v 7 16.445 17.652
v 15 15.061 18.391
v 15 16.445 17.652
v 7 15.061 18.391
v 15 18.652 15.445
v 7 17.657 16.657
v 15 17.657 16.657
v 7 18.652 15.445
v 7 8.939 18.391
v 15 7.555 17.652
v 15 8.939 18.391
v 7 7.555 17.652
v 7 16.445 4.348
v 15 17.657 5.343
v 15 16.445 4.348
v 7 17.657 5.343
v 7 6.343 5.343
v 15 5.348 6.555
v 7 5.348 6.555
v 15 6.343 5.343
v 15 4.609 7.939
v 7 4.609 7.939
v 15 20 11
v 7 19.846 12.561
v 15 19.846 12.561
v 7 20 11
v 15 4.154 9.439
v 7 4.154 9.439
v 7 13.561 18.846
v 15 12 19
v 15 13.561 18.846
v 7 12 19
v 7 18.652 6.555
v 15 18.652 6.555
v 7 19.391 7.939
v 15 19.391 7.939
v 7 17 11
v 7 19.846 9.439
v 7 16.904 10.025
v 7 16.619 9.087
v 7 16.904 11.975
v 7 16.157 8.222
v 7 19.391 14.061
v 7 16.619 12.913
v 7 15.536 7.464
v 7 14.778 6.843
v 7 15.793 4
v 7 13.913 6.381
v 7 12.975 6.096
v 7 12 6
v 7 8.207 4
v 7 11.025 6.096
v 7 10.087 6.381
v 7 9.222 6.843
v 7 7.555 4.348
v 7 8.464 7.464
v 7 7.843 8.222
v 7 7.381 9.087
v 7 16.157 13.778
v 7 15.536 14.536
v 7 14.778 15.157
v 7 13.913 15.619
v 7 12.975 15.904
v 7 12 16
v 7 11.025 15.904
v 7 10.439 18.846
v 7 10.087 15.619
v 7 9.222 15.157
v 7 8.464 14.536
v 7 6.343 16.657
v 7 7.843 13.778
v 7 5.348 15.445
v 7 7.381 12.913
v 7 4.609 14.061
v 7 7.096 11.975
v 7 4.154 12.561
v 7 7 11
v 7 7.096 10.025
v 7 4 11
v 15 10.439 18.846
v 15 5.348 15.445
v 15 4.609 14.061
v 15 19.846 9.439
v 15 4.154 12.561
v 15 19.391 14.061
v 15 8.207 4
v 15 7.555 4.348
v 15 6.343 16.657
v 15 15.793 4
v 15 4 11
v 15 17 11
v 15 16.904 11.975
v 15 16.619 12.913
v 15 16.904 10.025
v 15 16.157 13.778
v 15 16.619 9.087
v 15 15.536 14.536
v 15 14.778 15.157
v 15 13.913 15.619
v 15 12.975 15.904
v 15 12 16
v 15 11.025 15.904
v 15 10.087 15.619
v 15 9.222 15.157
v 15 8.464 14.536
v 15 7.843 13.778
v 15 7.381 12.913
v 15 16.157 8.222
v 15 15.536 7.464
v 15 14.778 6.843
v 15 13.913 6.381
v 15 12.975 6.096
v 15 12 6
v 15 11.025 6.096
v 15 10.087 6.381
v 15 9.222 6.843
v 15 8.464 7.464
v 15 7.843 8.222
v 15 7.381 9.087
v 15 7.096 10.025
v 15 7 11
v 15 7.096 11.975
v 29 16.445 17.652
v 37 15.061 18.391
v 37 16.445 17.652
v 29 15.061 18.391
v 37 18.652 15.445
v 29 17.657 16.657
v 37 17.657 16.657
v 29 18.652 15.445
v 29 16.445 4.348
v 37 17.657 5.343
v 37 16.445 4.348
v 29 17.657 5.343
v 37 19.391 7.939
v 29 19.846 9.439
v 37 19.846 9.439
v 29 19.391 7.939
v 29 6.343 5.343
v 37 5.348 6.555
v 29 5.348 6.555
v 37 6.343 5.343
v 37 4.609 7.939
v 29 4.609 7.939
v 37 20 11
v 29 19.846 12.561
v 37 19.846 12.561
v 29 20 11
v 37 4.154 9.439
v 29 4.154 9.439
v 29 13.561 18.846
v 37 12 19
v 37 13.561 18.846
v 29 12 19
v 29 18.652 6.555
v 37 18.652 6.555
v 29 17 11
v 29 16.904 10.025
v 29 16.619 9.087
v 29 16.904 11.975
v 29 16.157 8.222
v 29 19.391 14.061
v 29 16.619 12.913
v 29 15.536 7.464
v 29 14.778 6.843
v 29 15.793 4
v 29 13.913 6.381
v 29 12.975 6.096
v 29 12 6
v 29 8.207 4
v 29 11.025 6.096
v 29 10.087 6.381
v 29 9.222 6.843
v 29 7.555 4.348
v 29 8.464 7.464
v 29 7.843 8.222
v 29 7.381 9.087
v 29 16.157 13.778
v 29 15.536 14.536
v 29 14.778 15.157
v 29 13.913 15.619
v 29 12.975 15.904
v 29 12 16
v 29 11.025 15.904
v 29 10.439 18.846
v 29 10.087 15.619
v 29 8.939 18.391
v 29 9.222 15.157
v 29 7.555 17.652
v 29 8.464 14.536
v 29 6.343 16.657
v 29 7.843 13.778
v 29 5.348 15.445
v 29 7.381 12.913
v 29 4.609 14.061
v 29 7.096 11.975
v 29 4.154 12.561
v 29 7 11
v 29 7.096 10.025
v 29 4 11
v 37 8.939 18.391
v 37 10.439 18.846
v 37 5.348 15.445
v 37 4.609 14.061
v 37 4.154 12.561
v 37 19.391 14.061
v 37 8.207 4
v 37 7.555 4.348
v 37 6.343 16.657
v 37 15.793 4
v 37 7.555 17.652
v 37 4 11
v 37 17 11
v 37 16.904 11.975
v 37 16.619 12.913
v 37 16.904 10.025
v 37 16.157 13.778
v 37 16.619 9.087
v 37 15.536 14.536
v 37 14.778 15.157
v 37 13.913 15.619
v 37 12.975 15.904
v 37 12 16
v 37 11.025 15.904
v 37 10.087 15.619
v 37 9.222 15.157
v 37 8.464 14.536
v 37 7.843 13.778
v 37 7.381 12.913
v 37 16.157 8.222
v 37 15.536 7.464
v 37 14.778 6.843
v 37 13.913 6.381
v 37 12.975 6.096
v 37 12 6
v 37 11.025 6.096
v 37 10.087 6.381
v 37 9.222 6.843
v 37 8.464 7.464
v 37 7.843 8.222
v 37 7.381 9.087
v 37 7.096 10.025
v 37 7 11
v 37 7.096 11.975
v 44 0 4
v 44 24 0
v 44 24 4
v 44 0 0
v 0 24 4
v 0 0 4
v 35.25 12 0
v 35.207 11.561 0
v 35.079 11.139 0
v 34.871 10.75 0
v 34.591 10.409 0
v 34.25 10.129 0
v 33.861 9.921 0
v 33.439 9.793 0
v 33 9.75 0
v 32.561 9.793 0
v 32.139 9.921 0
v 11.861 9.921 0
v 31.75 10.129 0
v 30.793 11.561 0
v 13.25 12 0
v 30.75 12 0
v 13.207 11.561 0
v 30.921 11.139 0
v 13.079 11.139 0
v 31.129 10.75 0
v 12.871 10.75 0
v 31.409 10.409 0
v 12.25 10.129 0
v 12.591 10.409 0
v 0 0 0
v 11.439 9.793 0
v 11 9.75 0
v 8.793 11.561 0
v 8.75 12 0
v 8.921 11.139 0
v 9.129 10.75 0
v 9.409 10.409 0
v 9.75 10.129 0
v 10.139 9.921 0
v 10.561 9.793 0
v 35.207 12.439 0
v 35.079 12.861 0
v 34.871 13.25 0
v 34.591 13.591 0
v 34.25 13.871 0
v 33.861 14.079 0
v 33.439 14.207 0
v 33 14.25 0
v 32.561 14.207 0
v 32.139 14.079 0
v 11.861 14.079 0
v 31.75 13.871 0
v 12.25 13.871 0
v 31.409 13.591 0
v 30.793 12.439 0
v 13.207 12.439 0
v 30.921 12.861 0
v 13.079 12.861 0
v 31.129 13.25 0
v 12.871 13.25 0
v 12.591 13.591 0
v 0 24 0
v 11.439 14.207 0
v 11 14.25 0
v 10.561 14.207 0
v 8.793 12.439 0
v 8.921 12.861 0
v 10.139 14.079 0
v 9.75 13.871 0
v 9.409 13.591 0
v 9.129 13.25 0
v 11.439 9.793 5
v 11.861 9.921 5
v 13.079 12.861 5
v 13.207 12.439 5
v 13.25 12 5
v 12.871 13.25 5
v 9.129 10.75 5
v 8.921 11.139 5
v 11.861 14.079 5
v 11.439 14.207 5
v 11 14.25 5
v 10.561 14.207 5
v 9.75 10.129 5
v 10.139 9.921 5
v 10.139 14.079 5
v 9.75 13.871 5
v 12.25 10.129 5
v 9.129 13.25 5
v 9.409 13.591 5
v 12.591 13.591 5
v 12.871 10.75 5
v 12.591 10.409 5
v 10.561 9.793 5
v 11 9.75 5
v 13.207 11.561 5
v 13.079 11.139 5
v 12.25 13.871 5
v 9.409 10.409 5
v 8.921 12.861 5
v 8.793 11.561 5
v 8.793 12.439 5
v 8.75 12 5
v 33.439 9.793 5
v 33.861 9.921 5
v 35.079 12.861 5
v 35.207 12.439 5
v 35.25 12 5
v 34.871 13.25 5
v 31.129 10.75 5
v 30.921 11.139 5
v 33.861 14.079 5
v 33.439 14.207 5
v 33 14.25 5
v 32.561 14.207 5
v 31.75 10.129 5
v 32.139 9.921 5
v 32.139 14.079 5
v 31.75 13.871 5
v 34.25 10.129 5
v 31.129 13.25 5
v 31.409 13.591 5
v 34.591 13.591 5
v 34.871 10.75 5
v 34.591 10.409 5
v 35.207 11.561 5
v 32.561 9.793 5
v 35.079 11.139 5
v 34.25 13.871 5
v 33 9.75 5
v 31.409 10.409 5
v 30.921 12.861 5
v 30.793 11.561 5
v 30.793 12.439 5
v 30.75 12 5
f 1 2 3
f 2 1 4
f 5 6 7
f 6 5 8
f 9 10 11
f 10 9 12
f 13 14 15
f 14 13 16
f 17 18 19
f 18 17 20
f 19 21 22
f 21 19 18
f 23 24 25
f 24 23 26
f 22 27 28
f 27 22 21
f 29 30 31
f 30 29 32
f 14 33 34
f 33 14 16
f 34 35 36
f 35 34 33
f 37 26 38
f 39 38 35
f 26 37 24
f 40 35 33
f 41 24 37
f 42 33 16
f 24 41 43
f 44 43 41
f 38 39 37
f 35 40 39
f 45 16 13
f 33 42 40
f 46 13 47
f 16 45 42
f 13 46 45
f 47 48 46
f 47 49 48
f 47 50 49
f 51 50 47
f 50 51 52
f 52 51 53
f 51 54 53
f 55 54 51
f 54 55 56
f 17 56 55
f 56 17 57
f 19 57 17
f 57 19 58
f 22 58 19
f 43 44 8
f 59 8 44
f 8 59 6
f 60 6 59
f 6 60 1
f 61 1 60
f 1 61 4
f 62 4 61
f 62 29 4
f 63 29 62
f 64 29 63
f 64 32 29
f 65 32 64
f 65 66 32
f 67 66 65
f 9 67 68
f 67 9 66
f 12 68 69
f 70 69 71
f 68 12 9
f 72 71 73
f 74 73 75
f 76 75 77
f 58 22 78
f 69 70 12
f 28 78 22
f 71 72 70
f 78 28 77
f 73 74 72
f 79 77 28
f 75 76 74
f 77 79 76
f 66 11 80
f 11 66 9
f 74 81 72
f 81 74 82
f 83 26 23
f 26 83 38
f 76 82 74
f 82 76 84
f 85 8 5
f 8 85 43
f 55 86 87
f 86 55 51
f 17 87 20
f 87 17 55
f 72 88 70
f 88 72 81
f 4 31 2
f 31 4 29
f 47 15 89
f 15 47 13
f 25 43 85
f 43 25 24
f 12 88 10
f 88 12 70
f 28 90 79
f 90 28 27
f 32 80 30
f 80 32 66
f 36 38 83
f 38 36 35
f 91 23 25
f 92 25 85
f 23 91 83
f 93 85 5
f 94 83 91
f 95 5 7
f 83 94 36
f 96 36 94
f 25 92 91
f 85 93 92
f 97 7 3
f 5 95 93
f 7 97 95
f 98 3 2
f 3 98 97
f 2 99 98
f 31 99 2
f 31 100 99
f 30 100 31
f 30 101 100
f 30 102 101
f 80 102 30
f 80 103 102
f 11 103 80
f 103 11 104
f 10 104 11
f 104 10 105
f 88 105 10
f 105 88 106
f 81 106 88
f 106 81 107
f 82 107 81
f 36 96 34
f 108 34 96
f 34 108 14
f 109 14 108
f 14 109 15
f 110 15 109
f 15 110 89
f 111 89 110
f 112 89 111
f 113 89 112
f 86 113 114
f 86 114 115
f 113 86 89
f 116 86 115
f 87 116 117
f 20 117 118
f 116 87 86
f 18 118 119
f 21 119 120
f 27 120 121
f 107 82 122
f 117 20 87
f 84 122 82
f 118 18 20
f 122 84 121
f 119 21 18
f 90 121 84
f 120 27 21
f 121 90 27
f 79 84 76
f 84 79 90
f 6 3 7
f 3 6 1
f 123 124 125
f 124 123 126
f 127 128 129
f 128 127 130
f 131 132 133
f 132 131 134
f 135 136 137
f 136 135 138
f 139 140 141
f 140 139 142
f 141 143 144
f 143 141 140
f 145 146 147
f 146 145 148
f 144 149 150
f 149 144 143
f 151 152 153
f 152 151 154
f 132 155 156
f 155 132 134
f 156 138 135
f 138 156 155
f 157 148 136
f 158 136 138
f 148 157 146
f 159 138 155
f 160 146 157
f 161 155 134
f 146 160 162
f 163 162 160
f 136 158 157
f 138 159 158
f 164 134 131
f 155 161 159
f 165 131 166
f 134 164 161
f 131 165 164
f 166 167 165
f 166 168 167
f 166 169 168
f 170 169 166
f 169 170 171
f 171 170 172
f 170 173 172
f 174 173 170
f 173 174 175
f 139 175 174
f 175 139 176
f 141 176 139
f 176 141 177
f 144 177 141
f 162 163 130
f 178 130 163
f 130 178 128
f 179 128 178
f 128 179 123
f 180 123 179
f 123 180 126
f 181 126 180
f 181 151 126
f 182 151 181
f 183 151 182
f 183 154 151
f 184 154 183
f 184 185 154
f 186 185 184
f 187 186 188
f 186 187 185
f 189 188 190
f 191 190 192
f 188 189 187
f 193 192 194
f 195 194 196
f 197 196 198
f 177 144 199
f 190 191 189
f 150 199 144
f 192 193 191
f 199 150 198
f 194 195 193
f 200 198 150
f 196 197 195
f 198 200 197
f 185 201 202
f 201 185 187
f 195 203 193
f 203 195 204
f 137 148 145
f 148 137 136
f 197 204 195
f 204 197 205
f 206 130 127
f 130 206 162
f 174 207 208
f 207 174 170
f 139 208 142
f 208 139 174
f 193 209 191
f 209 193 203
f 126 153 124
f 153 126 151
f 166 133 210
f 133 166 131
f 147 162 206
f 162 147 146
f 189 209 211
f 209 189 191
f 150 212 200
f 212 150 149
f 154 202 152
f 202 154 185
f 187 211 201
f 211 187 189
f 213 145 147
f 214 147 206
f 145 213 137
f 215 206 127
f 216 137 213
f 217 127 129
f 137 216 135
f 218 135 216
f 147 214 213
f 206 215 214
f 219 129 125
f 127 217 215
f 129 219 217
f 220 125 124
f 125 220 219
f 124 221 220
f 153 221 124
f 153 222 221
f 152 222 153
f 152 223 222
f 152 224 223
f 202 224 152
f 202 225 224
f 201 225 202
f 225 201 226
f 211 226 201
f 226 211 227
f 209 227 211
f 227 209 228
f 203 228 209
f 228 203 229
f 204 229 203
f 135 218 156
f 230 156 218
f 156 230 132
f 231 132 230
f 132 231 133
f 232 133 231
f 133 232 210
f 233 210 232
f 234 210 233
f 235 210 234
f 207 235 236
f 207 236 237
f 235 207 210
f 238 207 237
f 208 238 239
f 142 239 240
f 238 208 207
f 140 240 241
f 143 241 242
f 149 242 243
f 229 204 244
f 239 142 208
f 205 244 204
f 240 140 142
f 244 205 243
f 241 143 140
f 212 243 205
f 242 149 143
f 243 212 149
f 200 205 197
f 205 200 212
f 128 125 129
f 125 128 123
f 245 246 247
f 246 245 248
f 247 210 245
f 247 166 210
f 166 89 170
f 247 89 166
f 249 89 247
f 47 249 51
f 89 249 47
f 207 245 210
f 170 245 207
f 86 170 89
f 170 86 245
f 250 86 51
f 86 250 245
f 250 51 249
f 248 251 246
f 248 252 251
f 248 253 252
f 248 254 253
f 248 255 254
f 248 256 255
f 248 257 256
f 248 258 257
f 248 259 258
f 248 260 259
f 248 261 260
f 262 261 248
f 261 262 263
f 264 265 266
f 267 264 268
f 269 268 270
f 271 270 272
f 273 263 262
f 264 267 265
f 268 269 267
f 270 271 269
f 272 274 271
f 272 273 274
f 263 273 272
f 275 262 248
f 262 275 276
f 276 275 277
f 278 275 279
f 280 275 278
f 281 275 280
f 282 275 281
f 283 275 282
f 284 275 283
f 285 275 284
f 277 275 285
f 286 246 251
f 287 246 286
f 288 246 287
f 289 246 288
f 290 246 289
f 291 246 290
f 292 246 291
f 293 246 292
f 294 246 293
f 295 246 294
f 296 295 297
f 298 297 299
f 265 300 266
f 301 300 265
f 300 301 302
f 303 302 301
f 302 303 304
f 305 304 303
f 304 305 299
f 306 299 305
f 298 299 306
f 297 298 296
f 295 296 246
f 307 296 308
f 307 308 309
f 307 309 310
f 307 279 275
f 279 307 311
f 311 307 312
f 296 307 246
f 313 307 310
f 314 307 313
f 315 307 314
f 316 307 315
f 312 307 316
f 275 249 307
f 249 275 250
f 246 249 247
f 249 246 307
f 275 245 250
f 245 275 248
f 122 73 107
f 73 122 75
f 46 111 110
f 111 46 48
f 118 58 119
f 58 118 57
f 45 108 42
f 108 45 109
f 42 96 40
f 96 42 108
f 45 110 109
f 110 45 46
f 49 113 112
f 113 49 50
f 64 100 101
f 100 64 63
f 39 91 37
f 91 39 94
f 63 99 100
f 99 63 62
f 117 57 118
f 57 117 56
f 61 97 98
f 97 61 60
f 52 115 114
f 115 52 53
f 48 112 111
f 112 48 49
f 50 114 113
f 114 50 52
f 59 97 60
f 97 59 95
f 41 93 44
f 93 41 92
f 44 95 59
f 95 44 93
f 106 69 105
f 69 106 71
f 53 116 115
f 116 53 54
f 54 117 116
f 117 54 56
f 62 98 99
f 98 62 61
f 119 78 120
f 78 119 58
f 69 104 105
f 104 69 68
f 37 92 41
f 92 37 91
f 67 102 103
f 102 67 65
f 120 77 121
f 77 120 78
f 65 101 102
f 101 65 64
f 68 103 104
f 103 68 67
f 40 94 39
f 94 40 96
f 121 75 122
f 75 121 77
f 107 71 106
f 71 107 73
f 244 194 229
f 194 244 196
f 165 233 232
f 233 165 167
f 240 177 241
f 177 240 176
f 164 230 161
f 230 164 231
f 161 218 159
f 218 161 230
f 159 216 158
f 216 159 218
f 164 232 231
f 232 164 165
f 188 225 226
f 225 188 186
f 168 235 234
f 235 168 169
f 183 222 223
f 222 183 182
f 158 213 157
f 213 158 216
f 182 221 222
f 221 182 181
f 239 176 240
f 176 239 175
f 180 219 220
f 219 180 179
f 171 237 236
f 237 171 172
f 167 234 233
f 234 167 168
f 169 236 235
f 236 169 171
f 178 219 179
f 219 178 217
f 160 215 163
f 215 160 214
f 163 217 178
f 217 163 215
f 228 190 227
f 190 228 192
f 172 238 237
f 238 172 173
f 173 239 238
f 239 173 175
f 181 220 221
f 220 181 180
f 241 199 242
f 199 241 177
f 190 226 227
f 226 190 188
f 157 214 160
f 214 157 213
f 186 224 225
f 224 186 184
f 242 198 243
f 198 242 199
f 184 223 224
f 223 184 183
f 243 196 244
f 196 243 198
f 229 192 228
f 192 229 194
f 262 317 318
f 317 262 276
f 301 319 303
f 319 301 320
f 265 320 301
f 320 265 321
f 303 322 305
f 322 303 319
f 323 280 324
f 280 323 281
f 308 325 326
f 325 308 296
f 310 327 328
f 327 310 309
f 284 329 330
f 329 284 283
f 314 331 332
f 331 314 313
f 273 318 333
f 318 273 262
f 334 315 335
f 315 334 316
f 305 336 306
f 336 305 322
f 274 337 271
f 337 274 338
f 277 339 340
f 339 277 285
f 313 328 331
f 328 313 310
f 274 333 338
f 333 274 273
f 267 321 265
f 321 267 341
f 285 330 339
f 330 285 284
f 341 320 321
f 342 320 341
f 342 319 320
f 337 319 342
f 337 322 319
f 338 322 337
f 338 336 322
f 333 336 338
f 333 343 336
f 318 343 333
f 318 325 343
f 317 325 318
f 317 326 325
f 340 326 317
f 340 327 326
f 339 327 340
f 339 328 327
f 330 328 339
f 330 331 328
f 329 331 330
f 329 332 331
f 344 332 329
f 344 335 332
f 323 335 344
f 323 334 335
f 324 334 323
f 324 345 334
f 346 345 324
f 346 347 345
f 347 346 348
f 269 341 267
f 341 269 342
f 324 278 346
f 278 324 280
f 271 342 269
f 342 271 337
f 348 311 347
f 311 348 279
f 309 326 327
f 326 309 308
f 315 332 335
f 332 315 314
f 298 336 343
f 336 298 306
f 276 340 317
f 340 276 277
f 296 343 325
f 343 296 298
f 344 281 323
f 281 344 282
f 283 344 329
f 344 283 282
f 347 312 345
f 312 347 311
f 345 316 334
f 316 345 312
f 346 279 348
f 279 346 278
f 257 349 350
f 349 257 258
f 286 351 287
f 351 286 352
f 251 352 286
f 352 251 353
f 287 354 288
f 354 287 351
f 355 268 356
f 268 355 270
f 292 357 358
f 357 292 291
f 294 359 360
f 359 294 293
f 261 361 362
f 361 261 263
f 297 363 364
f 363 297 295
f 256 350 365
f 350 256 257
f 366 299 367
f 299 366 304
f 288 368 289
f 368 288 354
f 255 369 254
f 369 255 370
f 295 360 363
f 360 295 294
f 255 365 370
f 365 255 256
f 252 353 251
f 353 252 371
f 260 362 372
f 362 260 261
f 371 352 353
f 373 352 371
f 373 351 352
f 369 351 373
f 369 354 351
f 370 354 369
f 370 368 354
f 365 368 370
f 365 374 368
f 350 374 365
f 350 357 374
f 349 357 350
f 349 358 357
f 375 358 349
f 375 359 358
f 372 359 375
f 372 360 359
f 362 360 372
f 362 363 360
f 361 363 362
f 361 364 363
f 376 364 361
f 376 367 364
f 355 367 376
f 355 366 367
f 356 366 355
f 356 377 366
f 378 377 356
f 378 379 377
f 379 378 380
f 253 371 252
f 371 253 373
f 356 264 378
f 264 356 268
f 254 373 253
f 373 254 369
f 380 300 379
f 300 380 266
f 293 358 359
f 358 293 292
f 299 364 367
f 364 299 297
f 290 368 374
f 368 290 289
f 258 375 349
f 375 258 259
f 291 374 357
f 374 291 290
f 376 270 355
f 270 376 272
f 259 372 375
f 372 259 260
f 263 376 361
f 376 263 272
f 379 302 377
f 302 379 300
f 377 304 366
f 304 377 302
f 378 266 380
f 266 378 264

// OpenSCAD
$fn = 32;

// ----------------------------------------------------------------------
// Cable clip: cable 10 mm, clamp 16 mm, base 44 mm
// ----------------------------------------------------------------------

// --- parameters (mm) ---
foot_w = 44;              // base length, X
foot_d = 24;              // base width, Y
foot_t = 4;               // base thickness
hose_seat_d = 16;         // clamp outside diameter
ring_t = 3;               // clamp wall
cable_d = 10;             // cable opening
ring_w = 8;               // clamp width along the cable
screw_d = 4.5;            // screw clearance
sink = 1;                 // overlap of the clamp into the base
pitch = 22;               // distance between the two clamps

module base() {
  cube([foot_w, foot_d, foot_t]);
}

module clamps() {
  for (sx = [-1, 1])
    translate([foot_w / 2 + sx * pitch / 2, foot_d / 2, foot_t + hose_seat_d / 2 - sink]) rotate([0, 90, 0])
      cylinder(h = ring_w, d = hose_seat_d, center = true);
}

difference() {
  union() {
    base();
    clamps();
  }
  for (sx = [-1, 1])
    translate([foot_w / 2 + sx * pitch / 2, foot_d / 2, foot_t + hose_seat_d / 2 - sink]) rotate([0, 90, 0]) translate([0, 0, -ring_w / 2 - 1]) cylinder(h = ring_w + 2, d = cable_d);
  translate([11, foot_d / 2, -1]) cylinder(h = foot_t + 2, d = screw_d);
  translate([33, foot_d / 2, -1]) cylinder(h = foot_t + 2, d = screw_d);
}
